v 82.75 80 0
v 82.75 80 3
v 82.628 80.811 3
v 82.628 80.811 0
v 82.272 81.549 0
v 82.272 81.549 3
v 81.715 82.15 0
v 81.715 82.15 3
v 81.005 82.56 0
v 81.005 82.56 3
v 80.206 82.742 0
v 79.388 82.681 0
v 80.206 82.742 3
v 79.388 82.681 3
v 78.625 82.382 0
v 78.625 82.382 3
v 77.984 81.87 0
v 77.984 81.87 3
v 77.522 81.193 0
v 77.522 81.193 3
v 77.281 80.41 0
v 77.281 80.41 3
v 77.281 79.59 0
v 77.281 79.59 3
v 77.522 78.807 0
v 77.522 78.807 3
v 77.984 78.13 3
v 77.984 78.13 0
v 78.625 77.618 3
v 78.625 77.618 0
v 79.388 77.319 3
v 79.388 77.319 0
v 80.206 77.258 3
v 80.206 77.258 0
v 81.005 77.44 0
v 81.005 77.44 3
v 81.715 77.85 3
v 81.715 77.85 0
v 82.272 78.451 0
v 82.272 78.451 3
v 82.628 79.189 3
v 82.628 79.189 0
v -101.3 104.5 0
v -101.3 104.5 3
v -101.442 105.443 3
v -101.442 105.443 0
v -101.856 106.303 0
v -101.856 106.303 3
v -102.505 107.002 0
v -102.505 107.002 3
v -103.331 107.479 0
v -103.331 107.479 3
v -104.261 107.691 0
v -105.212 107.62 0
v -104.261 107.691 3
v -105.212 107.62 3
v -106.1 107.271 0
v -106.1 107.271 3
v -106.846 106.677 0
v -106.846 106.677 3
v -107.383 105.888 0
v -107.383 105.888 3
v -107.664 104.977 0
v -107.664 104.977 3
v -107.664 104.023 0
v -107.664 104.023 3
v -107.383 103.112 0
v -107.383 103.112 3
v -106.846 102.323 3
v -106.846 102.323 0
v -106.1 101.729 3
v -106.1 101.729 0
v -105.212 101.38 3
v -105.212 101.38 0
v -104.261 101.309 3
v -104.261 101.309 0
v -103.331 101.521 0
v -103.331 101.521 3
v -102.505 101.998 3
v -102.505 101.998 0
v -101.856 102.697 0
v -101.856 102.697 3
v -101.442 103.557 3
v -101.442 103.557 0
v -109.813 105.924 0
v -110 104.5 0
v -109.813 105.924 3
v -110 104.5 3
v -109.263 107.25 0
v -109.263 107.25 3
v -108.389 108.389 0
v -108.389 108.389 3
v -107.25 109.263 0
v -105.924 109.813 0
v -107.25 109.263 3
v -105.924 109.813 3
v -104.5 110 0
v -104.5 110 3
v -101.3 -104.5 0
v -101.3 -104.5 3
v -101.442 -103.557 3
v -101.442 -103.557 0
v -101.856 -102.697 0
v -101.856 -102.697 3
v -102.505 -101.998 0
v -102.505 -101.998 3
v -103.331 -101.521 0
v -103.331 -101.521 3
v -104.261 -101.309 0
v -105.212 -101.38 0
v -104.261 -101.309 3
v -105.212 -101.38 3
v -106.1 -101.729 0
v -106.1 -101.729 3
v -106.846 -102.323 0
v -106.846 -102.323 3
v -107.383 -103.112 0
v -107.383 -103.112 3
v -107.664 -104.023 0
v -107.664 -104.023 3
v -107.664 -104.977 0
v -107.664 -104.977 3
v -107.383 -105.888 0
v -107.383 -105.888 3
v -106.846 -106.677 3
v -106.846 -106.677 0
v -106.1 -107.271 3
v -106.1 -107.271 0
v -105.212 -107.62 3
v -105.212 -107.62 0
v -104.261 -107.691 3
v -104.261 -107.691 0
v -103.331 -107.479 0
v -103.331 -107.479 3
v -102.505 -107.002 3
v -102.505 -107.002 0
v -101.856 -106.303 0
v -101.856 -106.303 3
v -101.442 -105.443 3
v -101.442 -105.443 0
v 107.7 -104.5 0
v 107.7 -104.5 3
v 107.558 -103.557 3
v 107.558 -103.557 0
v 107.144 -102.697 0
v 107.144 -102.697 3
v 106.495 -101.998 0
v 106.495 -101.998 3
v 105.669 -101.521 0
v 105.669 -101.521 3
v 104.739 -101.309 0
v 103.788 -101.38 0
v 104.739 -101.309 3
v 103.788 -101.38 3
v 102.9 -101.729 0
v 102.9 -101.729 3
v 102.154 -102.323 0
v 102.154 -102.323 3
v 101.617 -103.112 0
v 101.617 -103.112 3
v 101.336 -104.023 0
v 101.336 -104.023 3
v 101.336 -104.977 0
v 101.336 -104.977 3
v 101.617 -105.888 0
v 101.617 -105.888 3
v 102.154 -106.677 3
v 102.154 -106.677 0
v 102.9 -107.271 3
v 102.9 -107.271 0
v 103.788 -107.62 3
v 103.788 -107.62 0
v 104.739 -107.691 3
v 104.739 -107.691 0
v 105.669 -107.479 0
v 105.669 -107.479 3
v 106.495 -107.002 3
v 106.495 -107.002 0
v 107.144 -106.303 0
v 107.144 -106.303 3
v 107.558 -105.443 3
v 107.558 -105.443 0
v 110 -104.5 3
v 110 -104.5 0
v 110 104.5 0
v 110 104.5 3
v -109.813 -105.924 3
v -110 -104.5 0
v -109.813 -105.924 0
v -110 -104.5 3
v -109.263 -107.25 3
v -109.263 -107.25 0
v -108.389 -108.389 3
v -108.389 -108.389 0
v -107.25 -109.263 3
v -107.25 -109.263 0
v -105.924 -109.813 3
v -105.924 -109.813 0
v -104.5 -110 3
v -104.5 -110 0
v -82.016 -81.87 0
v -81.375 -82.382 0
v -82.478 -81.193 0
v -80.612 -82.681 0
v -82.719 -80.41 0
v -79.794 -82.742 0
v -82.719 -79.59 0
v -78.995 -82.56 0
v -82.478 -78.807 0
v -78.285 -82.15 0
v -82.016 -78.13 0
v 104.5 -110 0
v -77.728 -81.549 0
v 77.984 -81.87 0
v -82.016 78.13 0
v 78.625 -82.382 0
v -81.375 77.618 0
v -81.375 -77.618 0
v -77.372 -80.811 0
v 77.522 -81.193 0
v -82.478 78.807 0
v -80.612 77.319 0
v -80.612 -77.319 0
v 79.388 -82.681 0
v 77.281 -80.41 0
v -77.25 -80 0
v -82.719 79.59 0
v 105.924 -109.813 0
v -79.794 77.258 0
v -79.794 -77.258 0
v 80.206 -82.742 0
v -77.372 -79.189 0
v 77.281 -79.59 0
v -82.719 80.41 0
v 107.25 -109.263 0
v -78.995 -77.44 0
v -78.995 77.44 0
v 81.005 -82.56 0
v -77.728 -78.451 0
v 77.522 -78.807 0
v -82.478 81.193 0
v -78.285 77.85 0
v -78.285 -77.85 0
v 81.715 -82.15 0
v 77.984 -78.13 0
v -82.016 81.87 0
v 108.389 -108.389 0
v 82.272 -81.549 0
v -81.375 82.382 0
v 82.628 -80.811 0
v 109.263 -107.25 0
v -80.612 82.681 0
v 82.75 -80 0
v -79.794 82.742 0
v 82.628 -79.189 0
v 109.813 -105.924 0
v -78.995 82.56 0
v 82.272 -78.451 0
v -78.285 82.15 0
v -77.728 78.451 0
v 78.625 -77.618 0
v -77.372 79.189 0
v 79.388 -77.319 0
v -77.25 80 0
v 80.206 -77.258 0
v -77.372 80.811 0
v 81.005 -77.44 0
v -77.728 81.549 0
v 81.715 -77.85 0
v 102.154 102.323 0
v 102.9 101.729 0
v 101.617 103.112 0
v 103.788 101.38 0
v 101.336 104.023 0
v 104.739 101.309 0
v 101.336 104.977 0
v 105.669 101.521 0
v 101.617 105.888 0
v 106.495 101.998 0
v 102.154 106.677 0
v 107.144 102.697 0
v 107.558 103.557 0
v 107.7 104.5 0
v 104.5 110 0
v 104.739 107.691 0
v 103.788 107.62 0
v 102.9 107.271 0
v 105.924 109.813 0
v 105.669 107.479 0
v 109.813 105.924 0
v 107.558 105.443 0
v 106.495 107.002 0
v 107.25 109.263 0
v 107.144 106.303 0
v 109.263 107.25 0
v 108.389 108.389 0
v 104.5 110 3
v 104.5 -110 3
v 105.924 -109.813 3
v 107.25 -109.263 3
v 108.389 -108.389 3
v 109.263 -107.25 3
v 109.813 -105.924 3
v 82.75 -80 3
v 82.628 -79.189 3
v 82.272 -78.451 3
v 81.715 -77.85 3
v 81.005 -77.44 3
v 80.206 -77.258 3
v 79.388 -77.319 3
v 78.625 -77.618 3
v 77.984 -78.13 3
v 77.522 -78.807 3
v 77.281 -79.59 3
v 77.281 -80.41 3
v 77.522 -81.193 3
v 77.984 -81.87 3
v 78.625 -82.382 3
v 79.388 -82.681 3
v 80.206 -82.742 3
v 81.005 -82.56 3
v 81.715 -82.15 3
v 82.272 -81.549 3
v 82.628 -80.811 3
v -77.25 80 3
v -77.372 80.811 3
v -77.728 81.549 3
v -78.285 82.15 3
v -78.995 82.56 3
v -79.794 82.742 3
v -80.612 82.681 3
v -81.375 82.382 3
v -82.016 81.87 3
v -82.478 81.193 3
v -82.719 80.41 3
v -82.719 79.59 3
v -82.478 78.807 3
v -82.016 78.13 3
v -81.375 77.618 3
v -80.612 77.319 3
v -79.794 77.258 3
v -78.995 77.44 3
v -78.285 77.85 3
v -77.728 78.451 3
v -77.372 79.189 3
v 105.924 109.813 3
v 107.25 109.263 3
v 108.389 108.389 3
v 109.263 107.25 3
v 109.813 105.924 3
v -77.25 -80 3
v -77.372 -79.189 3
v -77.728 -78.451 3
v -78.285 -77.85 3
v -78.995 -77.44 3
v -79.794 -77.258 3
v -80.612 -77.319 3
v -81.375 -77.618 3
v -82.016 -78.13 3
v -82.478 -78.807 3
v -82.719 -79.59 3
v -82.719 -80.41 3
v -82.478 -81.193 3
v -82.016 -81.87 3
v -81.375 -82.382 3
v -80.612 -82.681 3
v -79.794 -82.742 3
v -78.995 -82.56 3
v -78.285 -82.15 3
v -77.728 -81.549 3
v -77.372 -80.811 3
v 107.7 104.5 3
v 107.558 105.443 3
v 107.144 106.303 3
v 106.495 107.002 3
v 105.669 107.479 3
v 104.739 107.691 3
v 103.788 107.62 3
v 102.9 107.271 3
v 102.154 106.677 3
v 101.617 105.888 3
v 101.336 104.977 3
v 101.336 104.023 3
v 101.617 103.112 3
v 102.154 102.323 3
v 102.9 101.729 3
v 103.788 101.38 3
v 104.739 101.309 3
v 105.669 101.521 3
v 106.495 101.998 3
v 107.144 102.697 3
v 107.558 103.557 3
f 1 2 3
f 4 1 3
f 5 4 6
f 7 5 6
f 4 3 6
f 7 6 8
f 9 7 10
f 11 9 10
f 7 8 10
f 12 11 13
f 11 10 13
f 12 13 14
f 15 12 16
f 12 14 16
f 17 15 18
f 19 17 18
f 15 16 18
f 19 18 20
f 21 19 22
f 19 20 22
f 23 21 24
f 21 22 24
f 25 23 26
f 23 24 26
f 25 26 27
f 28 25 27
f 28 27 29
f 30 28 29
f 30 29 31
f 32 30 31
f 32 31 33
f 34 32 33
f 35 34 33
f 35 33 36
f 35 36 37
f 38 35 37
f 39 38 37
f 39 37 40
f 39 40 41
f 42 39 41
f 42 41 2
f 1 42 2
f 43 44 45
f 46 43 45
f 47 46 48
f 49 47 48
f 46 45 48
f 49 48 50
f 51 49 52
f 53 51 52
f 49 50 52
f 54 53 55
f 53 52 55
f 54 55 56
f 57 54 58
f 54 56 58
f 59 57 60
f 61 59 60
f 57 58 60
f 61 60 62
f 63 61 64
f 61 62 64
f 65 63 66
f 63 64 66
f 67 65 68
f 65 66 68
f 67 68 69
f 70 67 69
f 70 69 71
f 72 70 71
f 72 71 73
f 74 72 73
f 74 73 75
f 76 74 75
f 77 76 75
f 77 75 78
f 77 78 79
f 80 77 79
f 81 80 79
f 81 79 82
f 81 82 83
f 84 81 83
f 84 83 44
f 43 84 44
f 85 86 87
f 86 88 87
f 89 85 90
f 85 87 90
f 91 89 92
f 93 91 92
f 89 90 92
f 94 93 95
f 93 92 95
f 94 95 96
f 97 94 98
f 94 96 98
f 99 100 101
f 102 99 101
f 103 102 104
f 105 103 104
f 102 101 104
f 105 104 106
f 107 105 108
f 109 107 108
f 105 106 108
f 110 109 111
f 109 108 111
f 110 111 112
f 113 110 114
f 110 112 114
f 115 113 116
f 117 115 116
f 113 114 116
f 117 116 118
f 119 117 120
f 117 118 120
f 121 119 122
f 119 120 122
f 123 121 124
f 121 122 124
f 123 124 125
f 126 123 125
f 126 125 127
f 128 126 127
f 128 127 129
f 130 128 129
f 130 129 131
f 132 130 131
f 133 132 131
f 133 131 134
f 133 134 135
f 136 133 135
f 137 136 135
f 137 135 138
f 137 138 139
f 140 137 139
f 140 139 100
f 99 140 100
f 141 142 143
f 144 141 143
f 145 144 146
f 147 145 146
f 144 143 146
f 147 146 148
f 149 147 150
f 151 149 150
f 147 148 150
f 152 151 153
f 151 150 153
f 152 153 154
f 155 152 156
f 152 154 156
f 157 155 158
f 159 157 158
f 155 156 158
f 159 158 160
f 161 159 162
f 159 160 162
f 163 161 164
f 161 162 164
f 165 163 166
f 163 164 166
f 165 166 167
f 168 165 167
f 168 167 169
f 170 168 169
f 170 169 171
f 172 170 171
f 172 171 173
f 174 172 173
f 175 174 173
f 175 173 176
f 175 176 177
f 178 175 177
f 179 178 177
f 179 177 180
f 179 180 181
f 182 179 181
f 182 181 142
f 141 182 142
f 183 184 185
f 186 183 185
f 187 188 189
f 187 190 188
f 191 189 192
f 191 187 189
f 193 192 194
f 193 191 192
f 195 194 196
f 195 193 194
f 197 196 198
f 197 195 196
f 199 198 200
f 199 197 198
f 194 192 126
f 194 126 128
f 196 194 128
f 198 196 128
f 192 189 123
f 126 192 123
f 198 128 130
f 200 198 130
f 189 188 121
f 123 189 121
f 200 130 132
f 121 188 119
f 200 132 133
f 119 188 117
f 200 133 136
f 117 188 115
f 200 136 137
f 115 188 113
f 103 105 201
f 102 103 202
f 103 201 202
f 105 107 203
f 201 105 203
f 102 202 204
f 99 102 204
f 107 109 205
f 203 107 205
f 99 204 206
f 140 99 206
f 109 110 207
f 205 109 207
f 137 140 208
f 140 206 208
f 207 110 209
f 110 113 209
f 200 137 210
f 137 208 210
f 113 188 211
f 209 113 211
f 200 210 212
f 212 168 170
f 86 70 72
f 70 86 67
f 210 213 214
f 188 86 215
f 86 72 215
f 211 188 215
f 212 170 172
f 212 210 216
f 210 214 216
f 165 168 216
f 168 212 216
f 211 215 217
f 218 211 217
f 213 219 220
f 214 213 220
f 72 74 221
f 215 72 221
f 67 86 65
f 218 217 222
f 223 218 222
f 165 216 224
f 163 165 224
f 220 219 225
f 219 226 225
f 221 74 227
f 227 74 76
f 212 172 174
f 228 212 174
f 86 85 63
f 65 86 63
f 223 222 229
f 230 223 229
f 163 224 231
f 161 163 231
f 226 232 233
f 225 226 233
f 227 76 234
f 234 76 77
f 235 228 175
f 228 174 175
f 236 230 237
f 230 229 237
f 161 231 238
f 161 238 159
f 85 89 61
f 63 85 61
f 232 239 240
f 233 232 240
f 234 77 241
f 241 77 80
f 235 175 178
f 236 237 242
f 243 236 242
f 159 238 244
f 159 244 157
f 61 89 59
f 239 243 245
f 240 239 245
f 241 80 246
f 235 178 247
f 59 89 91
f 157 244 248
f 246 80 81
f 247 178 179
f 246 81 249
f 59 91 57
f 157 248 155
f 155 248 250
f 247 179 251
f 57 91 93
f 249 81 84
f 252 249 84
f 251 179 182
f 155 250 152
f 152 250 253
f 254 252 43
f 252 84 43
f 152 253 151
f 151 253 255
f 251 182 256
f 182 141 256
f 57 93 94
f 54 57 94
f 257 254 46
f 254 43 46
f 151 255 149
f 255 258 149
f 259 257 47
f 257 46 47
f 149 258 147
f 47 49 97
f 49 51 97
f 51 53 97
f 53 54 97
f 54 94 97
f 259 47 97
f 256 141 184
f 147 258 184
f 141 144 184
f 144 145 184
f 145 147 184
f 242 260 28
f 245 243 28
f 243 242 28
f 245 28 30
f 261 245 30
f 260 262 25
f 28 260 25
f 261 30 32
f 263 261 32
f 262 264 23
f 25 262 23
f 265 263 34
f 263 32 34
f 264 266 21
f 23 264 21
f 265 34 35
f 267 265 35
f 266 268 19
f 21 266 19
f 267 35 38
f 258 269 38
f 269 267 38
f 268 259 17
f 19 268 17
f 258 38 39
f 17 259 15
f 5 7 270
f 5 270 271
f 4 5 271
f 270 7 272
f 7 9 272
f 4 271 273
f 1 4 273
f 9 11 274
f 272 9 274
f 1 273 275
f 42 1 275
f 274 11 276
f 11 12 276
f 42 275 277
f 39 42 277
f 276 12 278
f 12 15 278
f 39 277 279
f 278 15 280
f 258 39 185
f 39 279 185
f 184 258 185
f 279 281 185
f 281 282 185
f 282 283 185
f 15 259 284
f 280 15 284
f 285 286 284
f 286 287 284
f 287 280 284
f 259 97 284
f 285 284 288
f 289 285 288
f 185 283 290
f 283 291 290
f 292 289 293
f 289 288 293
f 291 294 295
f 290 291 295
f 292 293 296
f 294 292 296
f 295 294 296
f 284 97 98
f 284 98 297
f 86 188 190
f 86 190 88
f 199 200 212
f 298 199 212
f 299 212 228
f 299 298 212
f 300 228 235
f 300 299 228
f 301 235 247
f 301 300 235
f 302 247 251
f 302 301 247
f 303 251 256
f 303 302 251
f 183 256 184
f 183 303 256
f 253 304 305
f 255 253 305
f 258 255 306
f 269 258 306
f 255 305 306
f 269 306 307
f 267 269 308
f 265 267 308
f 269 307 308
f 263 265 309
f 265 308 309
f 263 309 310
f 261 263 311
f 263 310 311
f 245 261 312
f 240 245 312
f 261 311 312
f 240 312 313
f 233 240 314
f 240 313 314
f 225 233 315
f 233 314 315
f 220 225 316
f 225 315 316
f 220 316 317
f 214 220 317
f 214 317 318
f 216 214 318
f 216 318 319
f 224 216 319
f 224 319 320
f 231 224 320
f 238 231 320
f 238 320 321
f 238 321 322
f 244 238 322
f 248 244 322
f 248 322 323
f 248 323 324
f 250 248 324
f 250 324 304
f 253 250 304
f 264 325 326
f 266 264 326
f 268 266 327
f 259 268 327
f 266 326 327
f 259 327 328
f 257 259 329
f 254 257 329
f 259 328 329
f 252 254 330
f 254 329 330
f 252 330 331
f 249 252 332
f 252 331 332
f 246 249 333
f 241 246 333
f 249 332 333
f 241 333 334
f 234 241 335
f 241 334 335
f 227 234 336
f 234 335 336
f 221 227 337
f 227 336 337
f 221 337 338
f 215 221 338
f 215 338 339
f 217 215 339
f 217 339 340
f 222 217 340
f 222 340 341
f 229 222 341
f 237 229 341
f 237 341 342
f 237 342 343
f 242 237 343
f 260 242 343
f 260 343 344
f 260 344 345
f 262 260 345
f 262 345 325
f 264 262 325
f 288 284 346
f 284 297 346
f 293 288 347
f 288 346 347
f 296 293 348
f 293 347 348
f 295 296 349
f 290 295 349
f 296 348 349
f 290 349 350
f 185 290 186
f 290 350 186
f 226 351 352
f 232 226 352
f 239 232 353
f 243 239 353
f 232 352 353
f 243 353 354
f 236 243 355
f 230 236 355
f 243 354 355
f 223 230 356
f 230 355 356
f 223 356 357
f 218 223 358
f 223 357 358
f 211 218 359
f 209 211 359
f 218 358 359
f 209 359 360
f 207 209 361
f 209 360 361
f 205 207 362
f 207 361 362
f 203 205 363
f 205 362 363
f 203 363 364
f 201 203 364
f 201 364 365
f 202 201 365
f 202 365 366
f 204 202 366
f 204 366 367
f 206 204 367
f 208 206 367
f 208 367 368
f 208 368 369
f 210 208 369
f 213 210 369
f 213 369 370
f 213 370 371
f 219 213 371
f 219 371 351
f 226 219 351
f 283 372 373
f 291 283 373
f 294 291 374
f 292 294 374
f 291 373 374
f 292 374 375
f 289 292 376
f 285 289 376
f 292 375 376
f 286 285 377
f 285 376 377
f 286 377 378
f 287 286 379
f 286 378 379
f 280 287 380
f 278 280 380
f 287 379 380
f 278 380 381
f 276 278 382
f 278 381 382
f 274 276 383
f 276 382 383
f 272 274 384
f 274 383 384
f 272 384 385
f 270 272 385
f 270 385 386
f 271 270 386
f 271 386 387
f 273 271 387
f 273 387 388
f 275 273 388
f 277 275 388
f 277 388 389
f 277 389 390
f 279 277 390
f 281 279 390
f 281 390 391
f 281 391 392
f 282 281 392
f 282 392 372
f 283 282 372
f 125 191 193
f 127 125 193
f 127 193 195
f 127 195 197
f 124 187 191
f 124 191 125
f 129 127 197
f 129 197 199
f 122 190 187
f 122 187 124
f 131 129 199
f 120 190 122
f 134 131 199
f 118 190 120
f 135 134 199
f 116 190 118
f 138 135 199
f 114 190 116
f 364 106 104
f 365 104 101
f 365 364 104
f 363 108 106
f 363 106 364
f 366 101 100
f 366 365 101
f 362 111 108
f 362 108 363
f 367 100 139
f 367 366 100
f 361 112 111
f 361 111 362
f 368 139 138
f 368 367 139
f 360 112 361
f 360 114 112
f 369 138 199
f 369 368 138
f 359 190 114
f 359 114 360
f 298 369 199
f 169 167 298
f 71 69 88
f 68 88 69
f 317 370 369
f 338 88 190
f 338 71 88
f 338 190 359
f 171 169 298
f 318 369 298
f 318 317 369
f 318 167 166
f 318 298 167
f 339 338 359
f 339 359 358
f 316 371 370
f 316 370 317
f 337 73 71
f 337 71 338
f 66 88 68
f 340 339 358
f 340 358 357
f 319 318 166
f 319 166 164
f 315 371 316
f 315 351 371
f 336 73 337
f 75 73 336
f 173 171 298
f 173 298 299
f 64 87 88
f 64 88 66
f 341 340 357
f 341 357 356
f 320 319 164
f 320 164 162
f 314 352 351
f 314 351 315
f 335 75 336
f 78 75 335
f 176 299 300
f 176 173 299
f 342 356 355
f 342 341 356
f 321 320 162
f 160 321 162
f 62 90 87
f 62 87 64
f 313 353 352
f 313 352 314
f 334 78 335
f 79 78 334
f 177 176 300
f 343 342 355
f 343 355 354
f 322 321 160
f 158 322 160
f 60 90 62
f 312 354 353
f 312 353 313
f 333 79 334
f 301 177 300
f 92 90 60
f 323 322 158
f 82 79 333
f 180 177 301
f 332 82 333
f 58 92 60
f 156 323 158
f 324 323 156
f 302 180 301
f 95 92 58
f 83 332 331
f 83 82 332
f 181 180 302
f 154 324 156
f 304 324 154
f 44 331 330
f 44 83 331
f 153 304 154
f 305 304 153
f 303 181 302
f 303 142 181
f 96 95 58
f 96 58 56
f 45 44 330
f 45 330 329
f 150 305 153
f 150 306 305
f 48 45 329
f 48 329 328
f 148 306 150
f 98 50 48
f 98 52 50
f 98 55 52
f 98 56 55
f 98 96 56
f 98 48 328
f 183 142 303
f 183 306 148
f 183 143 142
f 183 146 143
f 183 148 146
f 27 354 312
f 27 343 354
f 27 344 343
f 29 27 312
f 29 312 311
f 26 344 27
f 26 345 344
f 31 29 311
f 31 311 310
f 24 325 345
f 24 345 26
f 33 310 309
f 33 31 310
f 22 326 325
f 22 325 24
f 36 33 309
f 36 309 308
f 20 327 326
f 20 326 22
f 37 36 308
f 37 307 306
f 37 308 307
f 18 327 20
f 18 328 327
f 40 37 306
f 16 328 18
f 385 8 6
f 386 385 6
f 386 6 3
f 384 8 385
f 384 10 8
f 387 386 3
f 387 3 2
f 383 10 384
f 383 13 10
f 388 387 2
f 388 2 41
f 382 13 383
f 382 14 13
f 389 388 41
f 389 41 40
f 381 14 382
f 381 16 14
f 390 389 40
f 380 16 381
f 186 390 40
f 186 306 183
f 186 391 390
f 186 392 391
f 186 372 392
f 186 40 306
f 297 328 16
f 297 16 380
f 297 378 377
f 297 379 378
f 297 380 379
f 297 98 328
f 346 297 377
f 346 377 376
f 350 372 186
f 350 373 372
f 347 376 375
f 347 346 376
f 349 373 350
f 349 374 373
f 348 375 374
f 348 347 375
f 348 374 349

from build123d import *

# Parameters (mm, degrees)
SKETCH_W        = 220
SKETCH_H        = 220
PAD_DEPTH       = 3
SKETCH001_R     = 3.2
POCKET_DEPTH    = 3.001
SKETCH002_R     = 2.75
POCKET001_DEPTH = 5
FILLET_R        = 5.5


with BuildPart() as part:
    # Sketch → Pad (new body)
    with BuildSketch(Plane.XY):
        Rectangle(SKETCH_W, SKETCH_H)
    extrude(amount=PAD_DEPTH)

    # Sketch001 (on Face6 of Pad) → Pocket (cut, through all)
    with BuildSketch(Plane.XY.offset(3)):
        with Locations((-104.5, 104.5)):
            Circle(SKETCH001_R)
        with Locations((104.5, 104.5)):
            Circle(SKETCH001_R)
        with Locations((104.5, -104.5)):
            Circle(SKETCH001_R)
        with Locations((-104.5, -104.5)):
            Circle(SKETCH001_R)
    extrude(amount=-POCKET_DEPTH, mode=Mode.SUBTRACT)

    # Sketch002 (on Face5 of Pocket) → Pocket001 (cut)
    with BuildSketch(Plane.XY.offset(3)):
        with Locations((-80, 80)):
            Circle(SKETCH002_R)
        with Locations((80, 80)):
            Circle(SKETCH002_R)
        with Locations((-80, -80)):
            Circle(SKETCH002_R)
        with Locations((80, -80)):
            Circle(SKETCH002_R)
    extrude(amount=-POCKET001_DEPTH, mode=Mode.SUBTRACT)

    # Fillet
    fillet_edges = [part.edges().sort_by_distance(p)[0] for p in [
        (-110, -110, 1.5),
        (110, -110, 1.5),
        (110, 110, 1.5),
        (-110, 110, 1.5),
    ]]
    fillet(fillet_edges, radius=FILLET_R)


solid = part.part
